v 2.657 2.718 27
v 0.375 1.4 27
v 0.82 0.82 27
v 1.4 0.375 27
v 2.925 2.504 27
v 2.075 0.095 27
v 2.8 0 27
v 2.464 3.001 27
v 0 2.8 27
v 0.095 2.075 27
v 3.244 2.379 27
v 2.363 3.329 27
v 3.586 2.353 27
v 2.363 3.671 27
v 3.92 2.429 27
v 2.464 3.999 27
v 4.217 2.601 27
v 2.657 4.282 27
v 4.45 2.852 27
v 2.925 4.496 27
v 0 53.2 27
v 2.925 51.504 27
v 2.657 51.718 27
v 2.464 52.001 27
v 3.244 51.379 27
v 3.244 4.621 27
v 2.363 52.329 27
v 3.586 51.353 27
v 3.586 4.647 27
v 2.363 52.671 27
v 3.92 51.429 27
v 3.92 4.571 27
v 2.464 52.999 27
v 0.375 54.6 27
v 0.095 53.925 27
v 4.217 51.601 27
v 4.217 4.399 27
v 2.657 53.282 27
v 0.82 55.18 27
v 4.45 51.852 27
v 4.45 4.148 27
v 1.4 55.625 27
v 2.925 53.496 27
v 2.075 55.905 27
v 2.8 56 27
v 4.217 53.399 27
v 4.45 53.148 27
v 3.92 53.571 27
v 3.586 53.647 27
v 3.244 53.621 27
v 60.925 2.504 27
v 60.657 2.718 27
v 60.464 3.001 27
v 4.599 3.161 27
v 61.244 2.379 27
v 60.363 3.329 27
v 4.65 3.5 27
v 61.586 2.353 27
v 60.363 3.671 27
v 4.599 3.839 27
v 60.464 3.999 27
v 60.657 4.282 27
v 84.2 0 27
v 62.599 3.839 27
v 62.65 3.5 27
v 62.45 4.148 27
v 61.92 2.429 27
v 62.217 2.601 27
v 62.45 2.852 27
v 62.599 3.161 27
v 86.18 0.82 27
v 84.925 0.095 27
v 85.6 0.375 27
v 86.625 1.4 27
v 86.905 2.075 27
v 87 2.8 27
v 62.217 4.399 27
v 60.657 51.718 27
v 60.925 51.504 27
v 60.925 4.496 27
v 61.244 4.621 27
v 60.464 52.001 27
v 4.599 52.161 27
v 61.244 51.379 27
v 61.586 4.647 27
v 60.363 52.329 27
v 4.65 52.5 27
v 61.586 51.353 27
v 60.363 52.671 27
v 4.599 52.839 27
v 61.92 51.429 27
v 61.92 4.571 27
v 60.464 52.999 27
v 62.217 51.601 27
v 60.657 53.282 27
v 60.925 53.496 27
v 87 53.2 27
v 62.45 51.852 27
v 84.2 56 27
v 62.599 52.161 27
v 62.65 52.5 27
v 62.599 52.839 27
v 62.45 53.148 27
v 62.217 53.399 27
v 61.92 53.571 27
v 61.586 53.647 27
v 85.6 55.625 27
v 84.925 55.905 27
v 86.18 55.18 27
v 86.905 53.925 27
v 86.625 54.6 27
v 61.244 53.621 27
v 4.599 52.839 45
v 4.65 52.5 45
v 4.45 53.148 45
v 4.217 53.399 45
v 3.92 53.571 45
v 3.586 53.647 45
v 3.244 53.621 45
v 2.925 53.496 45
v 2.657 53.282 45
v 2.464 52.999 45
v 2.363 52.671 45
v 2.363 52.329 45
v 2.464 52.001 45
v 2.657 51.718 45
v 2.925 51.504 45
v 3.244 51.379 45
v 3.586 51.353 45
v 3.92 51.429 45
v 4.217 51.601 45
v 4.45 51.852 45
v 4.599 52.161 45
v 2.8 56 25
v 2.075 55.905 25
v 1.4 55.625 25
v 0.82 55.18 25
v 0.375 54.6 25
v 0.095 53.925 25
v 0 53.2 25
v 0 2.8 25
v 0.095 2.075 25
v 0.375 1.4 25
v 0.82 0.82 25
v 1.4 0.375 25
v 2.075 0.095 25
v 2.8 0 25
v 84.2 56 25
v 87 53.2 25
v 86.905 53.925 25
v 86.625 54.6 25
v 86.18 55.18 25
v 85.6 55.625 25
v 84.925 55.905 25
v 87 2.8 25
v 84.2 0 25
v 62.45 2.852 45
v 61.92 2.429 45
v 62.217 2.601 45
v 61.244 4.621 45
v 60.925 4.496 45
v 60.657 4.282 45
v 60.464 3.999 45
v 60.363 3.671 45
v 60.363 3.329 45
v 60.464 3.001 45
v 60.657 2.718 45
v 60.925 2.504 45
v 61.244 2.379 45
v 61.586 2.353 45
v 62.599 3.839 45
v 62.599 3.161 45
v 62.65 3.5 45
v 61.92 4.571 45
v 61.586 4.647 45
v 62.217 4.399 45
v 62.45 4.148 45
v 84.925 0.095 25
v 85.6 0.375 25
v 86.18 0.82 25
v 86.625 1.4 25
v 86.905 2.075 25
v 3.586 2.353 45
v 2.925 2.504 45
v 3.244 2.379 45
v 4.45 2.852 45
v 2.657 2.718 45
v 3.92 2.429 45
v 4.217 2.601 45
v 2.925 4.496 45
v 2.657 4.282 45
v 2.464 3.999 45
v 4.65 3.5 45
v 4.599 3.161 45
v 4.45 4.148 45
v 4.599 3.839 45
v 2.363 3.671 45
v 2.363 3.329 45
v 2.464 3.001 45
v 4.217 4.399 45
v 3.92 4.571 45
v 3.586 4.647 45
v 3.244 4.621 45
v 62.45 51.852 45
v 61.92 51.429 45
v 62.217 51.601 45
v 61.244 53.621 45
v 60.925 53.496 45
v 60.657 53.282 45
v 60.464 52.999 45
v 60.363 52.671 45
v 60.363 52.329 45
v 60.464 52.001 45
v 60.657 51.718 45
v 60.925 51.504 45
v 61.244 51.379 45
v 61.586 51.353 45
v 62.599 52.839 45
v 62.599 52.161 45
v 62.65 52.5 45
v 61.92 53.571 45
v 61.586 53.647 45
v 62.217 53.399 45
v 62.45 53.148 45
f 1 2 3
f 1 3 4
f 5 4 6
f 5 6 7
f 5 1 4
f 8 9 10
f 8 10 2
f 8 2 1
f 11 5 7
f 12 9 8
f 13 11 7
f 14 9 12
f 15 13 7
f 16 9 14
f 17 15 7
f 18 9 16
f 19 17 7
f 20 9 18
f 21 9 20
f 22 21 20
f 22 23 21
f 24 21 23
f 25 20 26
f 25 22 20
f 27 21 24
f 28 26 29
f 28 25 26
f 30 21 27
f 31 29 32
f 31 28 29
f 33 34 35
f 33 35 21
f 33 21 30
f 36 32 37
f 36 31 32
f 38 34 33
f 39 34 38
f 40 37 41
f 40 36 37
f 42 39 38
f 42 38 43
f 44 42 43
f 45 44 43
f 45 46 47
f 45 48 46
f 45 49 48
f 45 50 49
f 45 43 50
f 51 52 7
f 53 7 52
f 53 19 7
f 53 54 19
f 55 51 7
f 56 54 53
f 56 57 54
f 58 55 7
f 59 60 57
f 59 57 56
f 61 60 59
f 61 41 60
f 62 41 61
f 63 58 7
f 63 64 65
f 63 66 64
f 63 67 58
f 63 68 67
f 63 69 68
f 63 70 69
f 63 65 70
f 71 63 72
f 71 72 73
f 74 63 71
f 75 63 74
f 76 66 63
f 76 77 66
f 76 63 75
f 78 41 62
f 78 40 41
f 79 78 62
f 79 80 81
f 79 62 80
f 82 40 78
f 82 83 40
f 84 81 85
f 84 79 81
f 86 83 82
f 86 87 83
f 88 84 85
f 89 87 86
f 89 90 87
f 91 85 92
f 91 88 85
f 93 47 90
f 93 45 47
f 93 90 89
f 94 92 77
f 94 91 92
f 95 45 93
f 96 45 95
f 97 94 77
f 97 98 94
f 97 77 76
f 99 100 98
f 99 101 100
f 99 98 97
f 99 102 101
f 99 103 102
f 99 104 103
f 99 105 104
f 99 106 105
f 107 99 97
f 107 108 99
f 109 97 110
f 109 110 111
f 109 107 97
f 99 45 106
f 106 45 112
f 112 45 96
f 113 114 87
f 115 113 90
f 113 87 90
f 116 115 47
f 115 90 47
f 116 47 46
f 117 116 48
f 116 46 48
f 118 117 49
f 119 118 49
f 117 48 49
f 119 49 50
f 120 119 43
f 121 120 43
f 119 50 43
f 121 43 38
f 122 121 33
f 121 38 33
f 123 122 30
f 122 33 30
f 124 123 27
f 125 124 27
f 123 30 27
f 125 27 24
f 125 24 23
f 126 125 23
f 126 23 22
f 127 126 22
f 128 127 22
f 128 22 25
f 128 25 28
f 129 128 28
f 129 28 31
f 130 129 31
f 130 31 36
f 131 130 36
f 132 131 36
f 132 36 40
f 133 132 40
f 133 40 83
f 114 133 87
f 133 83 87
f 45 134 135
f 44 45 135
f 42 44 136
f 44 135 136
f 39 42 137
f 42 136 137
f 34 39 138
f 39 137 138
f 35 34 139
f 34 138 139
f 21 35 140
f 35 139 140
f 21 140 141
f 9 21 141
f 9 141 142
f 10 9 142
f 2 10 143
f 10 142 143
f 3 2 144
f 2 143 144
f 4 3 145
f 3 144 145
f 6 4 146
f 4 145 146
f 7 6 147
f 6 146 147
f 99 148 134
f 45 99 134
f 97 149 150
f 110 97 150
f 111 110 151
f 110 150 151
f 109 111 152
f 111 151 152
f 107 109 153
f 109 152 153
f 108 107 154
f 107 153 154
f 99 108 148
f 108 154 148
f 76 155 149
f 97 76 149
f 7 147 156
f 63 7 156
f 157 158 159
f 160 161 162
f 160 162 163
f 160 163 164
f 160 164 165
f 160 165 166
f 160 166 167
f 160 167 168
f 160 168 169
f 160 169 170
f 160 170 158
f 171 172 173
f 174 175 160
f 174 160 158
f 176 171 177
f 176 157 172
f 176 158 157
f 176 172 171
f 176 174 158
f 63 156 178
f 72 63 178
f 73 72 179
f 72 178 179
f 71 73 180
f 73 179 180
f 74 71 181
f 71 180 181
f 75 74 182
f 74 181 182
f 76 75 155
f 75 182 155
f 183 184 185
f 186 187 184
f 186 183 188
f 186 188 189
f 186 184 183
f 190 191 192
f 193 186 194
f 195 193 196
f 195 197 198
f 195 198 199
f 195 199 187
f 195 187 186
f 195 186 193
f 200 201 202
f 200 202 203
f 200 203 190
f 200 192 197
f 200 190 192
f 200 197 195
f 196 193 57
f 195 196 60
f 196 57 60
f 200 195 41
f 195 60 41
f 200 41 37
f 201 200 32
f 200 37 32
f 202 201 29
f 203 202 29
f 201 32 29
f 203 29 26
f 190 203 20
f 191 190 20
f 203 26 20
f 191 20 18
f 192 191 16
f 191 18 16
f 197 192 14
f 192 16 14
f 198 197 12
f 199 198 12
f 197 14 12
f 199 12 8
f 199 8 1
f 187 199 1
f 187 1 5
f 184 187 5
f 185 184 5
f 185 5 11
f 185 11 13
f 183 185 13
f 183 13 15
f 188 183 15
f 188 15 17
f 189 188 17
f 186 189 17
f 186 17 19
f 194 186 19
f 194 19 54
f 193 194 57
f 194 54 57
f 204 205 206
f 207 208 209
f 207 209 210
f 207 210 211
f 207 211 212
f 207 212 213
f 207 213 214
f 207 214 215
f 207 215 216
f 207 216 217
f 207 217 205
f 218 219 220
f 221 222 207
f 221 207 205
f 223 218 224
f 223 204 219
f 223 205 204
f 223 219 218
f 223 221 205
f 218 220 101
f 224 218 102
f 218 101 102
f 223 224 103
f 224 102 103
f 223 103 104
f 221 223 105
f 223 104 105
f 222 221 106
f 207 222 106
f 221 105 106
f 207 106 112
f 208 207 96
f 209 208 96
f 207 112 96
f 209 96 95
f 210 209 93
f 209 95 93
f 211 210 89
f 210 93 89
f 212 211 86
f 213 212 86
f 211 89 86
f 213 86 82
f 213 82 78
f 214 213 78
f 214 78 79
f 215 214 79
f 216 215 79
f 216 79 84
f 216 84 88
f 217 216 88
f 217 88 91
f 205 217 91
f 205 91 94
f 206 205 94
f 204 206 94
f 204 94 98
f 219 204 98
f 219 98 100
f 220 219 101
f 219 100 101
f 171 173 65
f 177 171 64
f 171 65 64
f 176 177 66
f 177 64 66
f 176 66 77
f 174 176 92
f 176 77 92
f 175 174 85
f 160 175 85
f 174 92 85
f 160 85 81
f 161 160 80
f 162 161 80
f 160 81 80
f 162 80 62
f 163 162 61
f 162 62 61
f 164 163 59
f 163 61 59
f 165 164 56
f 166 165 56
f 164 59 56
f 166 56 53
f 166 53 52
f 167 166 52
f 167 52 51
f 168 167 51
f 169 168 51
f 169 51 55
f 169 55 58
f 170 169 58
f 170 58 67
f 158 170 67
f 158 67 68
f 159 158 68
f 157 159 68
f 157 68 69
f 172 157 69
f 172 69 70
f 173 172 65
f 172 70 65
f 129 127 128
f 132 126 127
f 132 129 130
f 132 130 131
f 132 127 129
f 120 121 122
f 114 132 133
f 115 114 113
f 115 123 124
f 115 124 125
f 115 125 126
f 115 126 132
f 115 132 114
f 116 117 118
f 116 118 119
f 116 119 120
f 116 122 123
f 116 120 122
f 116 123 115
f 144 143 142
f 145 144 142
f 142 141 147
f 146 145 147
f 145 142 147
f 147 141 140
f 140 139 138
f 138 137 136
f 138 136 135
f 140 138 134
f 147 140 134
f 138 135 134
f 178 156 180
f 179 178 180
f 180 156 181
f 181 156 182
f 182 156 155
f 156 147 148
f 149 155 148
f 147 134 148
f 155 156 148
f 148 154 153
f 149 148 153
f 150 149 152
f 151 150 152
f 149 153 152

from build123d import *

# Parameters (mm, degrees)
F0_R     = 1.15
F1_DEPTH = 2
F2_DEPTH = 105
F4_R     = 2.75
F4_R_2   = 1.75
F5_DEPTH = 2
F6_DEPTH = 2
F8_R     = 1.15
F9_DEPTH = 18


with BuildPart() as f1:
    # F0 (on Top) → F1 (new body)
    with BuildSketch(Plane.XY):
        with BuildLine():
            ThreePointArc((0, 2.8), (0.8201010127, 0.8201010127), (2.8, 0))
            Line((2.8, 0), (84.2, 0))
            ThreePointArc((84.2, 0), (86.1798989873, 0.8201010127), (87, 2.8))
            Line((87, 2.8), (87, 53.2))
            ThreePointArc((87, 53.2), (86.1798989873, 55.1798989873), (84.2, 56))
            Line((84.2, 56), (2.8, 56))
            ThreePointArc((2.8, 56), (0.8201010127, 55.1798989873), (0, 53.2))
            Line((0, 53.2), (0, 2.8))
        make_face()
        with Locations((3.5, 3.5)):
            Circle(F0_R, mode=Mode.SUBTRACT)
        with Locations((61.5, 3.5)):
            Circle(F0_R, mode=Mode.SUBTRACT)
        with Locations((3.5, 52.5)):
            Circle(F0_R, mode=Mode.SUBTRACT)
        with Locations((61.5, 52.5)):
            Circle(F0_R, mode=Mode.SUBTRACT)
        with Locations((3.5, 3.5)):
            Circle(F0_R)
        with Locations((61.5, 52.5)):
            Circle(F0_R)
        with Locations((61.5, 3.5)):
            Circle(F0_R)
        with Locations((3.5, 52.5)):
            Circle(F0_R)
    extrude(amount=F1_DEPTH)

    # F0 (on Top) → F2 (join)
    with BuildSketch(Plane.XY):
        with Locations((61.5, 3.5)):
            Circle(F0_R)
        with Locations((61.5, 52.5)):
            Circle(F0_R)
        with Locations((3.5, 52.5)):
            Circle(F0_R)
        with Locations((3.5, 3.5)):
            Circle(F0_R)
    extrude(amount=F2_DEPTH)


with BuildPart() as f5:
    # F4 (on offset) → F5 (new body)
    with BuildSketch(Plane.XY.offset(25)):
        with BuildLine():
            Line((84.2, 56), (2.8, 56))
            ThreePointArc((2.8, 56), (0.8201010127, 55.1798989873), (0, 53.2))
            Line((0, 53.2), (0, 2.8))
            ThreePointArc((0, 2.8), (0.8201010127, 0.8201010127), (2.8, 0))
            Line((2.8, 0), (84.2, 0))
            ThreePointArc((84.2, 0), (86.1798989873, 0.8201010127), (87, 2.8))
            Line((87, 2.8), (87, 53.2))
            ThreePointArc((87, 53.2), (86.1798989873, 55.1798989873), (84.2, 56))
        make_face()
        with Locations((3.5, 3.5)):
            Circle(F4_R, mode=Mode.SUBTRACT)
        with Locations((61.5, 3.5)):
            Circle(F4_R, mode=Mode.SUBTRACT)
        with Locations((3.5, 52.5)):
            Circle(F4_R, mode=Mode.SUBTRACT)
        with Locations((61.5, 52.5)):
            Circle(F4_R, mode=Mode.SUBTRACT)
        with Locations((3.5, 3.5)):
            Circle(F4_R)
        with Locations((3.5, 3.5)):
            Circle(F4_R_2, mode=Mode.SUBTRACT)
        with Locations((61.5, 3.5)):
            Circle(F4_R)
        with Locations((61.5, 3.5)):
            Circle(F4_R_2, mode=Mode.SUBTRACT)
        with Locations((61.5, 52.5)):
            Circle(F4_R)
        with Locations((61.5, 52.5)):
            Circle(F4_R_2, mode=Mode.SUBTRACT)
        with Locations((3.5, 52.5)):
            Circle(F4_R)
        with Locations((3.5, 52.5)):
            Circle(F4_R_2, mode=Mode.SUBTRACT)
        with Locations((3.5, 3.5)):
            Circle(F4_R_2)
        with Locations((61.5, 3.5)):
            Circle(F4_R_2)
        with Locations((61.5, 52.5)):
            Circle(F4_R_2)
        with Locations((3.5, 52.5)):
            Circle(F4_R_2)
    extrude(amount=F5_DEPTH)

    # F4 (on offset) → F6 (join, through all)
    with BuildSketch(Plane.XY.offset(25)):
        with Locations((3.5, 3.5)):
            Circle(F4_R)
        with Locations((3.5, 3.5)):
            Circle(F4_R_2, mode=Mode.SUBTRACT)
        with Locations((3.5, 52.5)):
            Circle(F4_R)
        with Locations((3.5, 52.5)):
            Circle(F4_R_2, mode=Mode.SUBTRACT)
        with Locations((61.5, 52.5)):
            Circle(F4_R)
        with Locations((61.5, 52.5)):
            Circle(F4_R_2, mode=Mode.SUBTRACT)
        with Locations((61.5, 3.5)):
            Circle(F4_R)
        with Locations((61.5, 3.5)):
            Circle(F4_R_2, mode=Mode.SUBTRACT)
    extrude(amount=F6_DEPTH)

    # F8 (on face) → F9 (join)
    with BuildSketch(Plane.XY.offset(27)):
        with Locations((3.5, 52.5)):
            Circle(F8_R)
        with Locations((61.5, 52.5)):
            Circle(F8_R)
        with Locations((61.5, 3.5)):
            Circle(F8_R)
        with Locations((3.5, 3.5)):
            Circle(F8_R)
    extrude(amount=F9_DEPTH)


solid = f5.part
